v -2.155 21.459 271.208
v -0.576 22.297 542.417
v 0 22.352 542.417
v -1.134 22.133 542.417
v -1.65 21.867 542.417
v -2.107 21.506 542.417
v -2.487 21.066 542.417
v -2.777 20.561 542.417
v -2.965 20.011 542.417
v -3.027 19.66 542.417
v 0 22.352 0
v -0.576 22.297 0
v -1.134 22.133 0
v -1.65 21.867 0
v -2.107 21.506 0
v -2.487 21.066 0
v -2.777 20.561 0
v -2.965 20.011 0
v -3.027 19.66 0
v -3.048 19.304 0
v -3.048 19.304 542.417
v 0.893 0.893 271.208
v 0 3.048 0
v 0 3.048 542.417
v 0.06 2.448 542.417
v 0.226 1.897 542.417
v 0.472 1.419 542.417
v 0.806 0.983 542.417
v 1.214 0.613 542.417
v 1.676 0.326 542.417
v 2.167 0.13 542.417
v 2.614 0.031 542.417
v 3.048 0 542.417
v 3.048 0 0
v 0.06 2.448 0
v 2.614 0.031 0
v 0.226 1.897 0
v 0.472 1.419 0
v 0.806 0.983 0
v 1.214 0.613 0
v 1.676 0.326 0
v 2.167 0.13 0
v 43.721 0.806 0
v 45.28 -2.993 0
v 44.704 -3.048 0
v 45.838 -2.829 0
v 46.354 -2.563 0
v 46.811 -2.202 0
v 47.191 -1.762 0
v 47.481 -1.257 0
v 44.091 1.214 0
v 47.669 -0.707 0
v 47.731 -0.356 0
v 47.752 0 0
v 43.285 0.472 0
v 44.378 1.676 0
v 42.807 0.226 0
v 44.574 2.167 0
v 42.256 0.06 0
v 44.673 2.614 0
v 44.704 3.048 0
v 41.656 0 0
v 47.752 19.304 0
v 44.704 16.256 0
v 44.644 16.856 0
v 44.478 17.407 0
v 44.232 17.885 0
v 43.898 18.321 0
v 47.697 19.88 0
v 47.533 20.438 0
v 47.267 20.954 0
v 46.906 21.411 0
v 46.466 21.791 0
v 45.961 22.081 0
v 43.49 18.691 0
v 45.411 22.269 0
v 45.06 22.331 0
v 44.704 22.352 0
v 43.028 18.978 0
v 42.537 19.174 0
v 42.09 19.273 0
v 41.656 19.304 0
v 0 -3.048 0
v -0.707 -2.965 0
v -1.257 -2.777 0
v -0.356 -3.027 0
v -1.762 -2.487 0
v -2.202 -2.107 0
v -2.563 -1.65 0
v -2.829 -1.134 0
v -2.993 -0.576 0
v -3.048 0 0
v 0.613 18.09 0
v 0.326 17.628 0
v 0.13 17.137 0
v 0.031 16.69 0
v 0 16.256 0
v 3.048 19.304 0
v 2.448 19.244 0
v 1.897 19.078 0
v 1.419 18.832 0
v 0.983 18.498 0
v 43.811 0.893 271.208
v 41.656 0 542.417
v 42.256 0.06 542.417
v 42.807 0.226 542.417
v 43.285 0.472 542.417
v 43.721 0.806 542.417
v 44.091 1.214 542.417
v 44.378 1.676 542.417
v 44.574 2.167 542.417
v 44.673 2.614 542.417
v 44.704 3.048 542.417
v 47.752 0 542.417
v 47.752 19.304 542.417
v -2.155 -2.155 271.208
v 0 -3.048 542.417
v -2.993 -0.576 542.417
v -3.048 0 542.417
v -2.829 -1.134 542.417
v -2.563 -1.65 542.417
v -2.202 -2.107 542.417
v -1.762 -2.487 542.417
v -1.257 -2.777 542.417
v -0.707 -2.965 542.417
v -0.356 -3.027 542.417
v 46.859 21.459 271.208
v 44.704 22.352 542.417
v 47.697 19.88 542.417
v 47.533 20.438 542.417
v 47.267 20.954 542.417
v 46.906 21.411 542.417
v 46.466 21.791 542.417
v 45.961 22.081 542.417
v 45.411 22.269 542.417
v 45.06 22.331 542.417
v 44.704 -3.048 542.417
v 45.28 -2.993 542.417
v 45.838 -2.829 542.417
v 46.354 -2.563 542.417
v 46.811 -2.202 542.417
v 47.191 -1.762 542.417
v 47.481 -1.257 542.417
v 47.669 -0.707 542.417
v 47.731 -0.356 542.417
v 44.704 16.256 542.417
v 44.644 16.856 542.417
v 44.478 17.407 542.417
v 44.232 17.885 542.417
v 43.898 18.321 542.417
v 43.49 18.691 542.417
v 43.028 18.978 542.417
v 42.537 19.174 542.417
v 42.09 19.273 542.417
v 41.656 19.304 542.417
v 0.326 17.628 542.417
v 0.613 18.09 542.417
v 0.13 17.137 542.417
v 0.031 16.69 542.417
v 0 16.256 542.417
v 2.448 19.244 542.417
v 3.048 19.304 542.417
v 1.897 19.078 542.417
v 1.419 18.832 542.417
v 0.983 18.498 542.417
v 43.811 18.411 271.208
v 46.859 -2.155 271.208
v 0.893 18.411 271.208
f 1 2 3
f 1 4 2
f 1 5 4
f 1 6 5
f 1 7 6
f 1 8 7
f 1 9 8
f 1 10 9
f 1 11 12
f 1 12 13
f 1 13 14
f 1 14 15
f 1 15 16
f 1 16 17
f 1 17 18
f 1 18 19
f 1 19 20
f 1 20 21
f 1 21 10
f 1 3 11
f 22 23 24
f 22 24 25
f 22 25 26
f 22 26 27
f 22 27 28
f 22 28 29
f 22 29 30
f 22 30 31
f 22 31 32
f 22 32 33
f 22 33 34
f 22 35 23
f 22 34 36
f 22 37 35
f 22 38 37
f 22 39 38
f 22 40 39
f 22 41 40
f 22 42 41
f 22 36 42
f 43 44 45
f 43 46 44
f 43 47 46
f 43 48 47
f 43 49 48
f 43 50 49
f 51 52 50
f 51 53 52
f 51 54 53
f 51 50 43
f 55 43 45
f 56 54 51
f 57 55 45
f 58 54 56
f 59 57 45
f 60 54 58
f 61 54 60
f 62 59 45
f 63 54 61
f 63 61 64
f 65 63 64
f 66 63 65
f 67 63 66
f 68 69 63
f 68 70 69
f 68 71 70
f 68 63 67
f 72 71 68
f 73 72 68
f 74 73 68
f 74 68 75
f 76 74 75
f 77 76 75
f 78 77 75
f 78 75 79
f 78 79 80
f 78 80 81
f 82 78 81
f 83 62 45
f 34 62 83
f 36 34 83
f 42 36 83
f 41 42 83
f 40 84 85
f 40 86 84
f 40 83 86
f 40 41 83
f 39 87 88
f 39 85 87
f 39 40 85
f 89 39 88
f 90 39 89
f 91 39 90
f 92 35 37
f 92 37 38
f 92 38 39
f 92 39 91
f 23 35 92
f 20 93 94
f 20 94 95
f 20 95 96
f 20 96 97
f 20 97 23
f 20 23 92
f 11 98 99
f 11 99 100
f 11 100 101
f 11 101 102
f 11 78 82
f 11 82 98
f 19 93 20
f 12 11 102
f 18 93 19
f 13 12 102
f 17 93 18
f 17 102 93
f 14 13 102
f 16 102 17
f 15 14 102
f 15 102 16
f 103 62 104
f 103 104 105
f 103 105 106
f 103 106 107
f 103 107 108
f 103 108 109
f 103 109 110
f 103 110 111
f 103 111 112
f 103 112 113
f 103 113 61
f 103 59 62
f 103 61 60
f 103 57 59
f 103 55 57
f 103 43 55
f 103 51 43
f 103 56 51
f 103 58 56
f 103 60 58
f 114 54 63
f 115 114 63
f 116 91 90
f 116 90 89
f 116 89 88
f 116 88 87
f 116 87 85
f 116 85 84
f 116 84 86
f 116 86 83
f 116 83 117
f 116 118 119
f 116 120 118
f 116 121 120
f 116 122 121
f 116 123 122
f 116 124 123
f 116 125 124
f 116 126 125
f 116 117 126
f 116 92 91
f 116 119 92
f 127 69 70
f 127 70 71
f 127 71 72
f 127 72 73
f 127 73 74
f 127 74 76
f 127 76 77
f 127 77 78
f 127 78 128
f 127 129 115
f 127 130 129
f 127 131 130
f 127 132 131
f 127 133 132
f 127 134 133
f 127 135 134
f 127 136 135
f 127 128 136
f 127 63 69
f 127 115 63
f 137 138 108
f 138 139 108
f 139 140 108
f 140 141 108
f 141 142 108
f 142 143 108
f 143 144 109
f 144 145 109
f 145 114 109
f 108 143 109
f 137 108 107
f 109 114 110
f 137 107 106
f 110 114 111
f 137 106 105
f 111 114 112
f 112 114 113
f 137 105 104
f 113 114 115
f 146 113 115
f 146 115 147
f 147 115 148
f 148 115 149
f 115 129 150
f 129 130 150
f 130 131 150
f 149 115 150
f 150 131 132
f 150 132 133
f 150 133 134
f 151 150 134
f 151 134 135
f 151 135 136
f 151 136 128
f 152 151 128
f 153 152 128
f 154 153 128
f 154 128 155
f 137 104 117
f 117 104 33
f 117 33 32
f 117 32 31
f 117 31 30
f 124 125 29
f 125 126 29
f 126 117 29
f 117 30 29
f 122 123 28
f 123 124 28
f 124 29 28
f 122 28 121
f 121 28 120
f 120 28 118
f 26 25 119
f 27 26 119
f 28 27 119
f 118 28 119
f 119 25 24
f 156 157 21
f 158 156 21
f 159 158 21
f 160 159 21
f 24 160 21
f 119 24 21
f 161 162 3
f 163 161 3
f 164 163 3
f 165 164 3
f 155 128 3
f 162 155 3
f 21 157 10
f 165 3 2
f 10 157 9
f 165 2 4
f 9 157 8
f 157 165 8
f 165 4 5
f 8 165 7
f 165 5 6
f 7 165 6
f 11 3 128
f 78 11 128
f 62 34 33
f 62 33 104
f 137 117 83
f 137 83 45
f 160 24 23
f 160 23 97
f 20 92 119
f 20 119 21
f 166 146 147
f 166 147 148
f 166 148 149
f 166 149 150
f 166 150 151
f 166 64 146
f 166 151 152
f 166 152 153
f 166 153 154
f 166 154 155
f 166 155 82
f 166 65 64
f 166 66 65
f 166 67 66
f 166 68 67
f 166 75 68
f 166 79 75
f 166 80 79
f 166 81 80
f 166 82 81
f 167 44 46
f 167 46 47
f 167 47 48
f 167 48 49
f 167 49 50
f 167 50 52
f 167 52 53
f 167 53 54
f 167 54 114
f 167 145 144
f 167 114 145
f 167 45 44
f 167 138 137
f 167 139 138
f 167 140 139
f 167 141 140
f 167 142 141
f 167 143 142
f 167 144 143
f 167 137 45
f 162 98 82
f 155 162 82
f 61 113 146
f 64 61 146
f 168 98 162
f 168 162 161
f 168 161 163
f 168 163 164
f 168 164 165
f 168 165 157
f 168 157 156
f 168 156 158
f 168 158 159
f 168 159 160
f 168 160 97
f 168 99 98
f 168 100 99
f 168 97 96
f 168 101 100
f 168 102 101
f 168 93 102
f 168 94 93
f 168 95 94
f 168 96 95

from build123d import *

# Parameters (mm, degrees)
SKETCH1_W           = 50.8
SKETCH1_H           = 25.4
SKETCH1_W_2         = 44.704
SKETCH1_H_2         = 19.304
BOSS_EXTRUDE1_DEPTH = 542.417
VARFILLET1_R        = 3.048


with BuildPart() as part:
    # Sketch1 → Boss-Extrude1 (new body)
    with BuildSketch(Plane.XY):
        with Locations((22.352, 9.652)):
            Rectangle(SKETCH1_W, SKETCH1_H)
        with Locations((22.352, 9.652)):
            Rectangle(SKETCH1_W_2, SKETCH1_H_2, mode=Mode.SUBTRACT)
    extrude(amount=BOSS_EXTRUDE1_DEPTH)

    # VarFillet1
    varfillet1_edges = [part.edges().sort_by_distance(p)[0] for p in [
        (0, 19.304, 271.2085),
        (0, 0, 271.2085),
        (44.704, 19.304, 271.2085),
        (44.704, 0, 271.2085),
        (47.752, -3.048, 271.2085),
        (47.752, 22.352, 271.2085),
        (-3.048, 22.352, 271.2085),
        (-3.048, -3.048, 271.2085),
    ]]
    fillet(varfillet1_edges, radius=VARFILLET1_R)


solid = part.part
